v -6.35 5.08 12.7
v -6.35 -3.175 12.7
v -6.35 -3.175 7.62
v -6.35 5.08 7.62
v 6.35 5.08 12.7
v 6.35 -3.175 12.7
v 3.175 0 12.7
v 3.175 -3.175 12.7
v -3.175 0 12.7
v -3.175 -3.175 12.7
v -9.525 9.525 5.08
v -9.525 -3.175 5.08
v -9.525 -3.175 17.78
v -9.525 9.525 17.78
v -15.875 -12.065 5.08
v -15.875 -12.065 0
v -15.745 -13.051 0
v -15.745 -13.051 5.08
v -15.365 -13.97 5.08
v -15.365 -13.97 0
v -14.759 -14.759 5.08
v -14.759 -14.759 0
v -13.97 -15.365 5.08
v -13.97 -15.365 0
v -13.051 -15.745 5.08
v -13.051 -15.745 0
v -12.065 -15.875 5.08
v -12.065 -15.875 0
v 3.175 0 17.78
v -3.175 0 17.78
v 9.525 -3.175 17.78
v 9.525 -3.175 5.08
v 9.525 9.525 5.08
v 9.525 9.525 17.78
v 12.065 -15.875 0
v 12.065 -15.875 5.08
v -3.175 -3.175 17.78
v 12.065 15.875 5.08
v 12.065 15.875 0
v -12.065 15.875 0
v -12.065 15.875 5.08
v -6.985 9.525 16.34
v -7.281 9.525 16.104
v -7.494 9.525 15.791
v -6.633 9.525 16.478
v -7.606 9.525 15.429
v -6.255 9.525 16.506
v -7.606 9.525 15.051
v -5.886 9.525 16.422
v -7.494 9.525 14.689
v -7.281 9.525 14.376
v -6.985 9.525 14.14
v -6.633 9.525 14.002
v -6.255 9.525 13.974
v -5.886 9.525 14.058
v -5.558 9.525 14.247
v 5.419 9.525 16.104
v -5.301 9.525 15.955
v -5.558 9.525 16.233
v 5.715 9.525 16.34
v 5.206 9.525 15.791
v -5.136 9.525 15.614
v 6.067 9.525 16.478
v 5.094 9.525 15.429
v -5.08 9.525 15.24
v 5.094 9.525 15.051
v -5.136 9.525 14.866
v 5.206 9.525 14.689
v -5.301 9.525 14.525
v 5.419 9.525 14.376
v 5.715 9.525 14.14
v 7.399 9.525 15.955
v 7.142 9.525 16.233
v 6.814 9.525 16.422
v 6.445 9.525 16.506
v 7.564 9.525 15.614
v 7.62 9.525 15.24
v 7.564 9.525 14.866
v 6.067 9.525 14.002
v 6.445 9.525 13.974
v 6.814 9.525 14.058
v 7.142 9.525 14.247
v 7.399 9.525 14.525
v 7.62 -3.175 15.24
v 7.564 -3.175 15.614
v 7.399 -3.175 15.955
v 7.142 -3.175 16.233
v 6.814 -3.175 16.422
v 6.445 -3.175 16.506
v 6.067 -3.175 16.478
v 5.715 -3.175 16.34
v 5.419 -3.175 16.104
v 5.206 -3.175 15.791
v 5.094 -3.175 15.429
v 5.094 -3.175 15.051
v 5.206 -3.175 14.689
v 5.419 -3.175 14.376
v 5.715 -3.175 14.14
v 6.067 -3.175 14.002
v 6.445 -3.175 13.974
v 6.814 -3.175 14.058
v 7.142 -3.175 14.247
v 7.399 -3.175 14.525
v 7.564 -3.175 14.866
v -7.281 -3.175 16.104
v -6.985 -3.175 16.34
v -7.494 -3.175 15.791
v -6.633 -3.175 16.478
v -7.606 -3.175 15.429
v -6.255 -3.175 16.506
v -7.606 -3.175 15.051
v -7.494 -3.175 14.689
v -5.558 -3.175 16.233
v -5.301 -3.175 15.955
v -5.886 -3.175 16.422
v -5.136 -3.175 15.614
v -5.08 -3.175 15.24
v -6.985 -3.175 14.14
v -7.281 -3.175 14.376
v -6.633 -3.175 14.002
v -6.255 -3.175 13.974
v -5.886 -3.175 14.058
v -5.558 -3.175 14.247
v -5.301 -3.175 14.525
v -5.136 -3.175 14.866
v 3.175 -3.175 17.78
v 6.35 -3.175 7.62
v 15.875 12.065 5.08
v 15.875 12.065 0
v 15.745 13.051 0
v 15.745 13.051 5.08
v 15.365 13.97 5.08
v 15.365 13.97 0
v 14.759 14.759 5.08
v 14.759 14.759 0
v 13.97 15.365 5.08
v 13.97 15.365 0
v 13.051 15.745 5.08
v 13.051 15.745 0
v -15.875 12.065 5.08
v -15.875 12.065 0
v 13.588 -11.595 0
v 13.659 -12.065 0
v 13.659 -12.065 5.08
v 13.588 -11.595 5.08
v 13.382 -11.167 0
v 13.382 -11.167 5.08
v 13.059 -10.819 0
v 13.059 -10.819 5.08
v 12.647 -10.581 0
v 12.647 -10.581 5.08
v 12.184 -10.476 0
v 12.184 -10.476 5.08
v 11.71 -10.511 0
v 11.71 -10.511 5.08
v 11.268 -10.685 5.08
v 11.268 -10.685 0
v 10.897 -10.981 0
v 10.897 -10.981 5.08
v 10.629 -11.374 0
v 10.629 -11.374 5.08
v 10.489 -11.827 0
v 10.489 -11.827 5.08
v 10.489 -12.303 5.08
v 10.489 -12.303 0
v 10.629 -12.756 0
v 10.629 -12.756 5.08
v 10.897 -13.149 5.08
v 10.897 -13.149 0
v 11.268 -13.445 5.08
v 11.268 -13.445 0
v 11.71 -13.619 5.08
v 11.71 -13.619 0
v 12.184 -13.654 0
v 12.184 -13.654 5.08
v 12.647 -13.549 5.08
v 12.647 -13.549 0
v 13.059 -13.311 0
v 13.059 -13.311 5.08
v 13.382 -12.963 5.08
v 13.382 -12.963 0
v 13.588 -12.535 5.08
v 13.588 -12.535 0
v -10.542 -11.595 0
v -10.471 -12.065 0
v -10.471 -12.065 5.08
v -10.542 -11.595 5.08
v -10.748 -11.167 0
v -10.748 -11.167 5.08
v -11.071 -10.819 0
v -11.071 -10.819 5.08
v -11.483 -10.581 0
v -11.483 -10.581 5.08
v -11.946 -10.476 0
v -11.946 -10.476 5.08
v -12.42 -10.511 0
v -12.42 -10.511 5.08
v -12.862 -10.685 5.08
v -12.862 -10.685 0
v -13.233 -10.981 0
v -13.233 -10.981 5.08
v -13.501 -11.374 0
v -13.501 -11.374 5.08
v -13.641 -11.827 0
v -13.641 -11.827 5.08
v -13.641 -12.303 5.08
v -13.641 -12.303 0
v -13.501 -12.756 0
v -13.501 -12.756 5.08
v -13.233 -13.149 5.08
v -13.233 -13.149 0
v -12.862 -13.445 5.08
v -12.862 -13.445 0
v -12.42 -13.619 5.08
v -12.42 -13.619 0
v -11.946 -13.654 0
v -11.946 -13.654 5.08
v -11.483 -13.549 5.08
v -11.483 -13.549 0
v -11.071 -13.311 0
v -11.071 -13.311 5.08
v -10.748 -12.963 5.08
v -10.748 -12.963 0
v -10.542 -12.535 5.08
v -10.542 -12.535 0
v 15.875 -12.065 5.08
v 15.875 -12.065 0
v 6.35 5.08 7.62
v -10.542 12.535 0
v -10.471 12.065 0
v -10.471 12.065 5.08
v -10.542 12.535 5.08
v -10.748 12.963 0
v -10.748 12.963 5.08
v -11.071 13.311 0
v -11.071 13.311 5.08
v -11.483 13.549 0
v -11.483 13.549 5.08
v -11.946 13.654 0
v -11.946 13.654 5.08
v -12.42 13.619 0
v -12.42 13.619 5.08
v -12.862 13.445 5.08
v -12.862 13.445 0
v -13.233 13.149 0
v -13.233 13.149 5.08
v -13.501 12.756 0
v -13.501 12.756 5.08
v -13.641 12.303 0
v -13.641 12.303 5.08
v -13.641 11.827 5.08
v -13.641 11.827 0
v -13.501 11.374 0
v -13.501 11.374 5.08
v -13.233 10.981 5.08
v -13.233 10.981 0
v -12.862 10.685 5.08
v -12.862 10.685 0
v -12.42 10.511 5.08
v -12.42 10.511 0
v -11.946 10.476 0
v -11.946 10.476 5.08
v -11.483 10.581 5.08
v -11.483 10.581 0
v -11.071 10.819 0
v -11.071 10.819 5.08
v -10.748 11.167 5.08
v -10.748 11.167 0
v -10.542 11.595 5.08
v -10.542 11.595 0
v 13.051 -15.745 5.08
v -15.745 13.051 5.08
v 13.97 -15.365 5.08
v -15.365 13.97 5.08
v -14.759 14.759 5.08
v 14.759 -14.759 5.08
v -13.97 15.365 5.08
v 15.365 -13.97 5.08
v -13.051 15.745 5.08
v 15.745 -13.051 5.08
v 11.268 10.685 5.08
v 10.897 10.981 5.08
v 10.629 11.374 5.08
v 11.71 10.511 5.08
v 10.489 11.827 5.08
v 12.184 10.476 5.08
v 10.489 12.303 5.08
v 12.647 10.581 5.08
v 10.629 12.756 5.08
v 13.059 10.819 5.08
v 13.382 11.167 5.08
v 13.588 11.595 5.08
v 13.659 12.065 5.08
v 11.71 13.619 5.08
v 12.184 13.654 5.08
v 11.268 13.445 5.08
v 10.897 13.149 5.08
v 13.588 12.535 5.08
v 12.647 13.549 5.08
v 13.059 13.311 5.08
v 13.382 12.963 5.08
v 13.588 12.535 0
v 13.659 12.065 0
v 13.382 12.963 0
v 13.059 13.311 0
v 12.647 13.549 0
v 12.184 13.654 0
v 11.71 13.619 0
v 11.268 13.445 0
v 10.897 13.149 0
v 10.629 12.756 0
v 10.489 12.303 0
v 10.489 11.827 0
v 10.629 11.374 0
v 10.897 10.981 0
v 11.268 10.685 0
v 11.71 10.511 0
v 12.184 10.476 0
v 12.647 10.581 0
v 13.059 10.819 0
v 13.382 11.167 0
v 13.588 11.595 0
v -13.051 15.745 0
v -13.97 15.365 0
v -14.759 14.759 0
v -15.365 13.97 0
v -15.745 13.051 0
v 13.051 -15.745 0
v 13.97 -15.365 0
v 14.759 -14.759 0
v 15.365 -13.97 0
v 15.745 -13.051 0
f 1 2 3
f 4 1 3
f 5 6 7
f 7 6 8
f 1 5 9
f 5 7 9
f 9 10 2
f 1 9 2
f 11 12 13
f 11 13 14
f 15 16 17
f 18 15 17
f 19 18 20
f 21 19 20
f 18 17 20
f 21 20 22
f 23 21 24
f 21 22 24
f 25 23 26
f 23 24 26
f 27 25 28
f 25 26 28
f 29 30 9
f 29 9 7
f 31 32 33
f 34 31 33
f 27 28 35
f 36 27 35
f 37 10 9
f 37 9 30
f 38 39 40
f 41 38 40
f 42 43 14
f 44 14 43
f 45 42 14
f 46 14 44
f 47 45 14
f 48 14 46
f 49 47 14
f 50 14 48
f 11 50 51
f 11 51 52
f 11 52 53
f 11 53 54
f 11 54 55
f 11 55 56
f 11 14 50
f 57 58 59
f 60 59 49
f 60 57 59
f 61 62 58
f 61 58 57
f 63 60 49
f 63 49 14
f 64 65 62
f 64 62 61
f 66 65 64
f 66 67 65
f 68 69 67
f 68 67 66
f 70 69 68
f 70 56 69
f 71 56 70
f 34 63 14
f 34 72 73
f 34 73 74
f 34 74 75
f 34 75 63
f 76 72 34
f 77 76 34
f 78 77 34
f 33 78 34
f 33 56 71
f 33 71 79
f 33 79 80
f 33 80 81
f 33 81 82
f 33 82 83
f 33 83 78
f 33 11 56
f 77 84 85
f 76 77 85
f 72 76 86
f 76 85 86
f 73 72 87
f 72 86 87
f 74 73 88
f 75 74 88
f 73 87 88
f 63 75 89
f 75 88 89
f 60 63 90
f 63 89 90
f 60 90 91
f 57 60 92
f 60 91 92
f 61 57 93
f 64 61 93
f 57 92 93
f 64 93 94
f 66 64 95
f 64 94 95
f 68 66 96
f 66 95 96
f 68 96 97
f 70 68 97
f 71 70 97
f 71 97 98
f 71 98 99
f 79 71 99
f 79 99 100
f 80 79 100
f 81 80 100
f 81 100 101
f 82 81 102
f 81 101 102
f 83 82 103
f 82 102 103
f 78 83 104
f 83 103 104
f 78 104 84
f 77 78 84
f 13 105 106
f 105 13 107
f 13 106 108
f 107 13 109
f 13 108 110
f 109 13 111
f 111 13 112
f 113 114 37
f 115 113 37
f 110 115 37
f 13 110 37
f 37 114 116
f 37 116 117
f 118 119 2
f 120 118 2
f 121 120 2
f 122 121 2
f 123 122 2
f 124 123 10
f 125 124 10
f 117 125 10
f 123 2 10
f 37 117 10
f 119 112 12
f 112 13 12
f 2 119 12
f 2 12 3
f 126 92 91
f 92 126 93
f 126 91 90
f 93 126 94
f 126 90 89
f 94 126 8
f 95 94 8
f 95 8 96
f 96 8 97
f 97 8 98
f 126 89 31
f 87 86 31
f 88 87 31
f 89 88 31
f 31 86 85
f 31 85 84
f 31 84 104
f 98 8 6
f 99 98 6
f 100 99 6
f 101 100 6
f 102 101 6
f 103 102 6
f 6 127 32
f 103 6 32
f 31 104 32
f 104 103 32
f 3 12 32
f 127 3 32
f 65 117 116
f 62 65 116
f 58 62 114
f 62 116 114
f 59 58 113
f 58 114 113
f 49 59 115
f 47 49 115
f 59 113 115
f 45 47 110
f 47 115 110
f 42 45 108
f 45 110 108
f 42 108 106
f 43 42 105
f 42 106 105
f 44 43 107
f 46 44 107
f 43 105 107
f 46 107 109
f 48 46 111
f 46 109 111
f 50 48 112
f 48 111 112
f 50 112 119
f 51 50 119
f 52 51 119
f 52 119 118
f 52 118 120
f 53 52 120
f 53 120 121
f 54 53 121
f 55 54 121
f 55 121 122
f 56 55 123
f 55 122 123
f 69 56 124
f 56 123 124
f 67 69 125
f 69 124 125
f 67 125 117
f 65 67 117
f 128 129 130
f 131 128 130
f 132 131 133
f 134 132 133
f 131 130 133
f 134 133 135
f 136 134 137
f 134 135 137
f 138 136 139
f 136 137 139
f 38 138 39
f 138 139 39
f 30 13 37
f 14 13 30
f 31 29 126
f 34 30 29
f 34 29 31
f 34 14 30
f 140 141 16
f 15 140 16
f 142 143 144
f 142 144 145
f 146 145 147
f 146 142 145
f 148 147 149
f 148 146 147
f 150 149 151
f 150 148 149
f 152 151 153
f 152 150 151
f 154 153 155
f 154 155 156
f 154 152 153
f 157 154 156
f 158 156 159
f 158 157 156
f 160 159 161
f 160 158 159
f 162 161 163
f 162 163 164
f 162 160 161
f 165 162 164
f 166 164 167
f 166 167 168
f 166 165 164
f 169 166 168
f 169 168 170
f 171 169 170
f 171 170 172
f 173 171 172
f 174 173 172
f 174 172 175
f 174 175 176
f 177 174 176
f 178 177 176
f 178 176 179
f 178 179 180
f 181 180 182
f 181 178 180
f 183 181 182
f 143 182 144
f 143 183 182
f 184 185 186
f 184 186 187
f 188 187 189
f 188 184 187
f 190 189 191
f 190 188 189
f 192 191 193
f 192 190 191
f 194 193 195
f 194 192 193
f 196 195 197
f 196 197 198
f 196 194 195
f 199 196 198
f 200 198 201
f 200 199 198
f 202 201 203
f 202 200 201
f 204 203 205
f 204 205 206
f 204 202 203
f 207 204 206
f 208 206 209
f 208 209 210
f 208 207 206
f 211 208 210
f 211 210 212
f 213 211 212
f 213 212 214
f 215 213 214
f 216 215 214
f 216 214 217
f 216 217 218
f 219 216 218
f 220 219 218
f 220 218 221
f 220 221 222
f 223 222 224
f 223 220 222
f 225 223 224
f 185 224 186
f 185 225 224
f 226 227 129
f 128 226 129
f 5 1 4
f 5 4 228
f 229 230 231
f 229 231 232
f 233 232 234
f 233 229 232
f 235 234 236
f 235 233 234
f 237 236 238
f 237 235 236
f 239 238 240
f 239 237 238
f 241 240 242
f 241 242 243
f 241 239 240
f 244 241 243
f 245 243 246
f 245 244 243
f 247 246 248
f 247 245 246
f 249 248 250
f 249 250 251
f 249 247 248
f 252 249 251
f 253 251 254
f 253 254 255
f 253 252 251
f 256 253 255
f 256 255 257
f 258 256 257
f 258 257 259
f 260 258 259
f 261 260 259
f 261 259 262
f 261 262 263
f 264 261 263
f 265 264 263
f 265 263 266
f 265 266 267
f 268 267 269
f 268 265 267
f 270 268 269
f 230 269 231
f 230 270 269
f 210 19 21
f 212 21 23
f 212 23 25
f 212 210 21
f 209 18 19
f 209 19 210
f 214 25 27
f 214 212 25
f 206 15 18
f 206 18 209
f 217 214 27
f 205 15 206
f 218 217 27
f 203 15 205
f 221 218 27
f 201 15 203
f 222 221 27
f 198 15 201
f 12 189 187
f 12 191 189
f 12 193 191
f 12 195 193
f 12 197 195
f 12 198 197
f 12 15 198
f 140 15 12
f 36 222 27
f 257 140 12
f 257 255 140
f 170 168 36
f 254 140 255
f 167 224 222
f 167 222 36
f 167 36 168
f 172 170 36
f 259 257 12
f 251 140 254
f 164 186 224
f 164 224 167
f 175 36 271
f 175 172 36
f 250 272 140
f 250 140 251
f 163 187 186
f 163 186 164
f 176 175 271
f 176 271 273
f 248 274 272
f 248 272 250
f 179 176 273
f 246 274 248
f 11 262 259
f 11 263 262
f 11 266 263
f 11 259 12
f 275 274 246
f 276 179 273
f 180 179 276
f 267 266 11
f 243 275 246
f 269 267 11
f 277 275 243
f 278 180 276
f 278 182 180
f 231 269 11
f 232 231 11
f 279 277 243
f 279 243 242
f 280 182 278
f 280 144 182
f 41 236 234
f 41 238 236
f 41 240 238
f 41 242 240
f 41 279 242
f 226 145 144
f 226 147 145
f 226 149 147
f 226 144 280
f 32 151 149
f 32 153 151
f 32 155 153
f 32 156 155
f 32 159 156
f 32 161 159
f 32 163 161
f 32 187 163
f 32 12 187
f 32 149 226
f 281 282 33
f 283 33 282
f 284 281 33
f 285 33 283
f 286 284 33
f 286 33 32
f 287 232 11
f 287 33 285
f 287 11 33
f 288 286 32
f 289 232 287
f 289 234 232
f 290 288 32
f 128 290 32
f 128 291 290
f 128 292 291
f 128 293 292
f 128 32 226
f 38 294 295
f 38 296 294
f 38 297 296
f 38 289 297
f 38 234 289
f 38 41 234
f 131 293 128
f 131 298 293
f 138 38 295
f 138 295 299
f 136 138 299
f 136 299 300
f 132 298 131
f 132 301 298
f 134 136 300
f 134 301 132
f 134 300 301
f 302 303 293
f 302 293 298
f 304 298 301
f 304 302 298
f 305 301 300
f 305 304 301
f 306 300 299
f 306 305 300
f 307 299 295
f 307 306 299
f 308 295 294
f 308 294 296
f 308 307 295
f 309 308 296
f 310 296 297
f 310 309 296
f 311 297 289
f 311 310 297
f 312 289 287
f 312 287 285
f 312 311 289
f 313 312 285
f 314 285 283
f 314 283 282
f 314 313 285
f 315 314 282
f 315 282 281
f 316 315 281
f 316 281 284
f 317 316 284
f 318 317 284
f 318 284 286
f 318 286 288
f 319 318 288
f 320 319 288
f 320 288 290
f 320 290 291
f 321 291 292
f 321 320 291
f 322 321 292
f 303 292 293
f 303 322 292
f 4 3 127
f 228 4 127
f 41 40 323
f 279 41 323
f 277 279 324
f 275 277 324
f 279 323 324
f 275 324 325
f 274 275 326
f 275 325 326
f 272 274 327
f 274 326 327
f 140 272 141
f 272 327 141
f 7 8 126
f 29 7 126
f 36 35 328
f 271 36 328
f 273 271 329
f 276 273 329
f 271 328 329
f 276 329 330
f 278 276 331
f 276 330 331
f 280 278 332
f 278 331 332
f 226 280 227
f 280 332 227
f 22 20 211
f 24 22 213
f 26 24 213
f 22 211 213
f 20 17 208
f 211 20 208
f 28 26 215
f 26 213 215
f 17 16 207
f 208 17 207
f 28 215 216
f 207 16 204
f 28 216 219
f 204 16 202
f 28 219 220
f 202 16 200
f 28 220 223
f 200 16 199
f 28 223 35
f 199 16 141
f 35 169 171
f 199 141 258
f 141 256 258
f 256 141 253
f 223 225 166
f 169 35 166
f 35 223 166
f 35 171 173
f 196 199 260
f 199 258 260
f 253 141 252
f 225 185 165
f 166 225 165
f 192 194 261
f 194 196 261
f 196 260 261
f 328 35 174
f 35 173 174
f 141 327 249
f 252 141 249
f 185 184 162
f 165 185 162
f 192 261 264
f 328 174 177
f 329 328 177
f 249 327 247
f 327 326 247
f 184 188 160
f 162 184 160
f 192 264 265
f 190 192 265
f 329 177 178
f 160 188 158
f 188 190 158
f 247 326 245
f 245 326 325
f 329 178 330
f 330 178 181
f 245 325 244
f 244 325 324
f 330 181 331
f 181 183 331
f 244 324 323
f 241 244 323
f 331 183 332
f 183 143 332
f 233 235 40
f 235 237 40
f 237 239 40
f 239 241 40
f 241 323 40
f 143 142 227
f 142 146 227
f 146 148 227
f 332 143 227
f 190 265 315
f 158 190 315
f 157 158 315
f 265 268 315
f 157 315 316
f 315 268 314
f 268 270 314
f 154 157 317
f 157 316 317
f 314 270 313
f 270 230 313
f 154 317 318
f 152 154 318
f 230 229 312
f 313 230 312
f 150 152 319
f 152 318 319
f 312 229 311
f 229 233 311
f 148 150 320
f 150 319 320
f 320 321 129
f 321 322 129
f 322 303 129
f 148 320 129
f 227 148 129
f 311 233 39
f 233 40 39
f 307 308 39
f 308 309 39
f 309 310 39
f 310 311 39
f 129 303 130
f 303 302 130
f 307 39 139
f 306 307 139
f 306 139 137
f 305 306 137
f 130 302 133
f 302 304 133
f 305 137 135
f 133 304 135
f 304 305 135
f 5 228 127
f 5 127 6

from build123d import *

# Parameters (mm, degrees)
F0_R     = 1.593679
F1_DEPTH = 5.08
F2_W     = 19.05
F2_H     = 12.7
F3_DEPTH = 12.7
F4_W     = 6.35
F4_H     = 5.08
F5_DEPTH = 3.175
F6_W     = 12.7
F6_H     = 5.08
F7_DEPTH = 5.08
F8_R     = 1.27
F9_DEPTH = 12.7


with BuildPart() as f1:
    # F0 (on Top) → F1 (new body)
    with BuildSketch(Plane.XY):
        with BuildLine():
            ThreePointArc((15.875, 12.065), (14.759077, 14.759077), (12.065, 15.875))
            Line((12.065, 15.875), (-12.065, 15.875))
            ThreePointArc((-12.065, 15.875), (-14.759077, 14.759077), (-15.875, 12.065))
            Line((-15.875, 12.065), (-15.875, -12.065))
            ThreePointArc((-15.875, -12.065), (-14.759077, -14.759077), (-12.065, -15.875))
            Line((-12.065, -15.875), (12.065, -15.875))
            ThreePointArc((12.065, -15.875), (14.759077, -14.759077), (15.875, -12.065))
            Line((15.875, -12.065), (15.875, 12.065))
        make_face()
        with Locations((-12.065, -12.065)):
            Circle(F0_R, mode=Mode.SUBTRACT)
        with Locations((12.065, -12.065)):
            Circle(F0_R, mode=Mode.SUBTRACT)
        with Locations((-12.065, 12.065)):
            Circle(F0_R, mode=Mode.SUBTRACT)
        with Locations((12.065, 12.065)):
            Circle(F0_R, mode=Mode.SUBTRACT)
    extrude(amount=F1_DEPTH)

    # F2 (on face) → F3 (join)
    with BuildSketch(Plane.XY.offset(5.08)):
        with Locations((0, 3.175)):
            Rectangle(F2_W, F2_H)
    extrude(amount=F3_DEPTH)

    # F4 (on face) → F5 (cut)
    with BuildSketch(Plane.XZ.offset(3.175)):
        with Locations((0, 15.24)):
            Rectangle(F4_W, F4_H)
        Polygon((3.175, 12.7), (-3.175, 12.7), (-6.35, 12.7), (-6.35, 7.62), (6.35, 7.62), (6.35, 12.7), align=None)
    extrude(amount=-F5_DEPTH, mode=Mode.SUBTRACT)

    # F6 (on face) → F7 (cut)
    with BuildSketch(Plane.XZ):
        with Locations((0, 10.16)):
            Rectangle(F6_W, F6_H)
    extrude(amount=-F7_DEPTH, mode=Mode.SUBTRACT)

    # F8 (on face) → F9 (cut)
    with BuildSketch(Plane.XZ.offset(3.175)):
        with Locations((-6.35, 15.24)):
            Circle(F8_R)
        with Locations((6.35, 15.24)):
            Circle(F8_R)
    extrude(amount=-F9_DEPTH, mode=Mode.SUBTRACT)


solid = f1.part
